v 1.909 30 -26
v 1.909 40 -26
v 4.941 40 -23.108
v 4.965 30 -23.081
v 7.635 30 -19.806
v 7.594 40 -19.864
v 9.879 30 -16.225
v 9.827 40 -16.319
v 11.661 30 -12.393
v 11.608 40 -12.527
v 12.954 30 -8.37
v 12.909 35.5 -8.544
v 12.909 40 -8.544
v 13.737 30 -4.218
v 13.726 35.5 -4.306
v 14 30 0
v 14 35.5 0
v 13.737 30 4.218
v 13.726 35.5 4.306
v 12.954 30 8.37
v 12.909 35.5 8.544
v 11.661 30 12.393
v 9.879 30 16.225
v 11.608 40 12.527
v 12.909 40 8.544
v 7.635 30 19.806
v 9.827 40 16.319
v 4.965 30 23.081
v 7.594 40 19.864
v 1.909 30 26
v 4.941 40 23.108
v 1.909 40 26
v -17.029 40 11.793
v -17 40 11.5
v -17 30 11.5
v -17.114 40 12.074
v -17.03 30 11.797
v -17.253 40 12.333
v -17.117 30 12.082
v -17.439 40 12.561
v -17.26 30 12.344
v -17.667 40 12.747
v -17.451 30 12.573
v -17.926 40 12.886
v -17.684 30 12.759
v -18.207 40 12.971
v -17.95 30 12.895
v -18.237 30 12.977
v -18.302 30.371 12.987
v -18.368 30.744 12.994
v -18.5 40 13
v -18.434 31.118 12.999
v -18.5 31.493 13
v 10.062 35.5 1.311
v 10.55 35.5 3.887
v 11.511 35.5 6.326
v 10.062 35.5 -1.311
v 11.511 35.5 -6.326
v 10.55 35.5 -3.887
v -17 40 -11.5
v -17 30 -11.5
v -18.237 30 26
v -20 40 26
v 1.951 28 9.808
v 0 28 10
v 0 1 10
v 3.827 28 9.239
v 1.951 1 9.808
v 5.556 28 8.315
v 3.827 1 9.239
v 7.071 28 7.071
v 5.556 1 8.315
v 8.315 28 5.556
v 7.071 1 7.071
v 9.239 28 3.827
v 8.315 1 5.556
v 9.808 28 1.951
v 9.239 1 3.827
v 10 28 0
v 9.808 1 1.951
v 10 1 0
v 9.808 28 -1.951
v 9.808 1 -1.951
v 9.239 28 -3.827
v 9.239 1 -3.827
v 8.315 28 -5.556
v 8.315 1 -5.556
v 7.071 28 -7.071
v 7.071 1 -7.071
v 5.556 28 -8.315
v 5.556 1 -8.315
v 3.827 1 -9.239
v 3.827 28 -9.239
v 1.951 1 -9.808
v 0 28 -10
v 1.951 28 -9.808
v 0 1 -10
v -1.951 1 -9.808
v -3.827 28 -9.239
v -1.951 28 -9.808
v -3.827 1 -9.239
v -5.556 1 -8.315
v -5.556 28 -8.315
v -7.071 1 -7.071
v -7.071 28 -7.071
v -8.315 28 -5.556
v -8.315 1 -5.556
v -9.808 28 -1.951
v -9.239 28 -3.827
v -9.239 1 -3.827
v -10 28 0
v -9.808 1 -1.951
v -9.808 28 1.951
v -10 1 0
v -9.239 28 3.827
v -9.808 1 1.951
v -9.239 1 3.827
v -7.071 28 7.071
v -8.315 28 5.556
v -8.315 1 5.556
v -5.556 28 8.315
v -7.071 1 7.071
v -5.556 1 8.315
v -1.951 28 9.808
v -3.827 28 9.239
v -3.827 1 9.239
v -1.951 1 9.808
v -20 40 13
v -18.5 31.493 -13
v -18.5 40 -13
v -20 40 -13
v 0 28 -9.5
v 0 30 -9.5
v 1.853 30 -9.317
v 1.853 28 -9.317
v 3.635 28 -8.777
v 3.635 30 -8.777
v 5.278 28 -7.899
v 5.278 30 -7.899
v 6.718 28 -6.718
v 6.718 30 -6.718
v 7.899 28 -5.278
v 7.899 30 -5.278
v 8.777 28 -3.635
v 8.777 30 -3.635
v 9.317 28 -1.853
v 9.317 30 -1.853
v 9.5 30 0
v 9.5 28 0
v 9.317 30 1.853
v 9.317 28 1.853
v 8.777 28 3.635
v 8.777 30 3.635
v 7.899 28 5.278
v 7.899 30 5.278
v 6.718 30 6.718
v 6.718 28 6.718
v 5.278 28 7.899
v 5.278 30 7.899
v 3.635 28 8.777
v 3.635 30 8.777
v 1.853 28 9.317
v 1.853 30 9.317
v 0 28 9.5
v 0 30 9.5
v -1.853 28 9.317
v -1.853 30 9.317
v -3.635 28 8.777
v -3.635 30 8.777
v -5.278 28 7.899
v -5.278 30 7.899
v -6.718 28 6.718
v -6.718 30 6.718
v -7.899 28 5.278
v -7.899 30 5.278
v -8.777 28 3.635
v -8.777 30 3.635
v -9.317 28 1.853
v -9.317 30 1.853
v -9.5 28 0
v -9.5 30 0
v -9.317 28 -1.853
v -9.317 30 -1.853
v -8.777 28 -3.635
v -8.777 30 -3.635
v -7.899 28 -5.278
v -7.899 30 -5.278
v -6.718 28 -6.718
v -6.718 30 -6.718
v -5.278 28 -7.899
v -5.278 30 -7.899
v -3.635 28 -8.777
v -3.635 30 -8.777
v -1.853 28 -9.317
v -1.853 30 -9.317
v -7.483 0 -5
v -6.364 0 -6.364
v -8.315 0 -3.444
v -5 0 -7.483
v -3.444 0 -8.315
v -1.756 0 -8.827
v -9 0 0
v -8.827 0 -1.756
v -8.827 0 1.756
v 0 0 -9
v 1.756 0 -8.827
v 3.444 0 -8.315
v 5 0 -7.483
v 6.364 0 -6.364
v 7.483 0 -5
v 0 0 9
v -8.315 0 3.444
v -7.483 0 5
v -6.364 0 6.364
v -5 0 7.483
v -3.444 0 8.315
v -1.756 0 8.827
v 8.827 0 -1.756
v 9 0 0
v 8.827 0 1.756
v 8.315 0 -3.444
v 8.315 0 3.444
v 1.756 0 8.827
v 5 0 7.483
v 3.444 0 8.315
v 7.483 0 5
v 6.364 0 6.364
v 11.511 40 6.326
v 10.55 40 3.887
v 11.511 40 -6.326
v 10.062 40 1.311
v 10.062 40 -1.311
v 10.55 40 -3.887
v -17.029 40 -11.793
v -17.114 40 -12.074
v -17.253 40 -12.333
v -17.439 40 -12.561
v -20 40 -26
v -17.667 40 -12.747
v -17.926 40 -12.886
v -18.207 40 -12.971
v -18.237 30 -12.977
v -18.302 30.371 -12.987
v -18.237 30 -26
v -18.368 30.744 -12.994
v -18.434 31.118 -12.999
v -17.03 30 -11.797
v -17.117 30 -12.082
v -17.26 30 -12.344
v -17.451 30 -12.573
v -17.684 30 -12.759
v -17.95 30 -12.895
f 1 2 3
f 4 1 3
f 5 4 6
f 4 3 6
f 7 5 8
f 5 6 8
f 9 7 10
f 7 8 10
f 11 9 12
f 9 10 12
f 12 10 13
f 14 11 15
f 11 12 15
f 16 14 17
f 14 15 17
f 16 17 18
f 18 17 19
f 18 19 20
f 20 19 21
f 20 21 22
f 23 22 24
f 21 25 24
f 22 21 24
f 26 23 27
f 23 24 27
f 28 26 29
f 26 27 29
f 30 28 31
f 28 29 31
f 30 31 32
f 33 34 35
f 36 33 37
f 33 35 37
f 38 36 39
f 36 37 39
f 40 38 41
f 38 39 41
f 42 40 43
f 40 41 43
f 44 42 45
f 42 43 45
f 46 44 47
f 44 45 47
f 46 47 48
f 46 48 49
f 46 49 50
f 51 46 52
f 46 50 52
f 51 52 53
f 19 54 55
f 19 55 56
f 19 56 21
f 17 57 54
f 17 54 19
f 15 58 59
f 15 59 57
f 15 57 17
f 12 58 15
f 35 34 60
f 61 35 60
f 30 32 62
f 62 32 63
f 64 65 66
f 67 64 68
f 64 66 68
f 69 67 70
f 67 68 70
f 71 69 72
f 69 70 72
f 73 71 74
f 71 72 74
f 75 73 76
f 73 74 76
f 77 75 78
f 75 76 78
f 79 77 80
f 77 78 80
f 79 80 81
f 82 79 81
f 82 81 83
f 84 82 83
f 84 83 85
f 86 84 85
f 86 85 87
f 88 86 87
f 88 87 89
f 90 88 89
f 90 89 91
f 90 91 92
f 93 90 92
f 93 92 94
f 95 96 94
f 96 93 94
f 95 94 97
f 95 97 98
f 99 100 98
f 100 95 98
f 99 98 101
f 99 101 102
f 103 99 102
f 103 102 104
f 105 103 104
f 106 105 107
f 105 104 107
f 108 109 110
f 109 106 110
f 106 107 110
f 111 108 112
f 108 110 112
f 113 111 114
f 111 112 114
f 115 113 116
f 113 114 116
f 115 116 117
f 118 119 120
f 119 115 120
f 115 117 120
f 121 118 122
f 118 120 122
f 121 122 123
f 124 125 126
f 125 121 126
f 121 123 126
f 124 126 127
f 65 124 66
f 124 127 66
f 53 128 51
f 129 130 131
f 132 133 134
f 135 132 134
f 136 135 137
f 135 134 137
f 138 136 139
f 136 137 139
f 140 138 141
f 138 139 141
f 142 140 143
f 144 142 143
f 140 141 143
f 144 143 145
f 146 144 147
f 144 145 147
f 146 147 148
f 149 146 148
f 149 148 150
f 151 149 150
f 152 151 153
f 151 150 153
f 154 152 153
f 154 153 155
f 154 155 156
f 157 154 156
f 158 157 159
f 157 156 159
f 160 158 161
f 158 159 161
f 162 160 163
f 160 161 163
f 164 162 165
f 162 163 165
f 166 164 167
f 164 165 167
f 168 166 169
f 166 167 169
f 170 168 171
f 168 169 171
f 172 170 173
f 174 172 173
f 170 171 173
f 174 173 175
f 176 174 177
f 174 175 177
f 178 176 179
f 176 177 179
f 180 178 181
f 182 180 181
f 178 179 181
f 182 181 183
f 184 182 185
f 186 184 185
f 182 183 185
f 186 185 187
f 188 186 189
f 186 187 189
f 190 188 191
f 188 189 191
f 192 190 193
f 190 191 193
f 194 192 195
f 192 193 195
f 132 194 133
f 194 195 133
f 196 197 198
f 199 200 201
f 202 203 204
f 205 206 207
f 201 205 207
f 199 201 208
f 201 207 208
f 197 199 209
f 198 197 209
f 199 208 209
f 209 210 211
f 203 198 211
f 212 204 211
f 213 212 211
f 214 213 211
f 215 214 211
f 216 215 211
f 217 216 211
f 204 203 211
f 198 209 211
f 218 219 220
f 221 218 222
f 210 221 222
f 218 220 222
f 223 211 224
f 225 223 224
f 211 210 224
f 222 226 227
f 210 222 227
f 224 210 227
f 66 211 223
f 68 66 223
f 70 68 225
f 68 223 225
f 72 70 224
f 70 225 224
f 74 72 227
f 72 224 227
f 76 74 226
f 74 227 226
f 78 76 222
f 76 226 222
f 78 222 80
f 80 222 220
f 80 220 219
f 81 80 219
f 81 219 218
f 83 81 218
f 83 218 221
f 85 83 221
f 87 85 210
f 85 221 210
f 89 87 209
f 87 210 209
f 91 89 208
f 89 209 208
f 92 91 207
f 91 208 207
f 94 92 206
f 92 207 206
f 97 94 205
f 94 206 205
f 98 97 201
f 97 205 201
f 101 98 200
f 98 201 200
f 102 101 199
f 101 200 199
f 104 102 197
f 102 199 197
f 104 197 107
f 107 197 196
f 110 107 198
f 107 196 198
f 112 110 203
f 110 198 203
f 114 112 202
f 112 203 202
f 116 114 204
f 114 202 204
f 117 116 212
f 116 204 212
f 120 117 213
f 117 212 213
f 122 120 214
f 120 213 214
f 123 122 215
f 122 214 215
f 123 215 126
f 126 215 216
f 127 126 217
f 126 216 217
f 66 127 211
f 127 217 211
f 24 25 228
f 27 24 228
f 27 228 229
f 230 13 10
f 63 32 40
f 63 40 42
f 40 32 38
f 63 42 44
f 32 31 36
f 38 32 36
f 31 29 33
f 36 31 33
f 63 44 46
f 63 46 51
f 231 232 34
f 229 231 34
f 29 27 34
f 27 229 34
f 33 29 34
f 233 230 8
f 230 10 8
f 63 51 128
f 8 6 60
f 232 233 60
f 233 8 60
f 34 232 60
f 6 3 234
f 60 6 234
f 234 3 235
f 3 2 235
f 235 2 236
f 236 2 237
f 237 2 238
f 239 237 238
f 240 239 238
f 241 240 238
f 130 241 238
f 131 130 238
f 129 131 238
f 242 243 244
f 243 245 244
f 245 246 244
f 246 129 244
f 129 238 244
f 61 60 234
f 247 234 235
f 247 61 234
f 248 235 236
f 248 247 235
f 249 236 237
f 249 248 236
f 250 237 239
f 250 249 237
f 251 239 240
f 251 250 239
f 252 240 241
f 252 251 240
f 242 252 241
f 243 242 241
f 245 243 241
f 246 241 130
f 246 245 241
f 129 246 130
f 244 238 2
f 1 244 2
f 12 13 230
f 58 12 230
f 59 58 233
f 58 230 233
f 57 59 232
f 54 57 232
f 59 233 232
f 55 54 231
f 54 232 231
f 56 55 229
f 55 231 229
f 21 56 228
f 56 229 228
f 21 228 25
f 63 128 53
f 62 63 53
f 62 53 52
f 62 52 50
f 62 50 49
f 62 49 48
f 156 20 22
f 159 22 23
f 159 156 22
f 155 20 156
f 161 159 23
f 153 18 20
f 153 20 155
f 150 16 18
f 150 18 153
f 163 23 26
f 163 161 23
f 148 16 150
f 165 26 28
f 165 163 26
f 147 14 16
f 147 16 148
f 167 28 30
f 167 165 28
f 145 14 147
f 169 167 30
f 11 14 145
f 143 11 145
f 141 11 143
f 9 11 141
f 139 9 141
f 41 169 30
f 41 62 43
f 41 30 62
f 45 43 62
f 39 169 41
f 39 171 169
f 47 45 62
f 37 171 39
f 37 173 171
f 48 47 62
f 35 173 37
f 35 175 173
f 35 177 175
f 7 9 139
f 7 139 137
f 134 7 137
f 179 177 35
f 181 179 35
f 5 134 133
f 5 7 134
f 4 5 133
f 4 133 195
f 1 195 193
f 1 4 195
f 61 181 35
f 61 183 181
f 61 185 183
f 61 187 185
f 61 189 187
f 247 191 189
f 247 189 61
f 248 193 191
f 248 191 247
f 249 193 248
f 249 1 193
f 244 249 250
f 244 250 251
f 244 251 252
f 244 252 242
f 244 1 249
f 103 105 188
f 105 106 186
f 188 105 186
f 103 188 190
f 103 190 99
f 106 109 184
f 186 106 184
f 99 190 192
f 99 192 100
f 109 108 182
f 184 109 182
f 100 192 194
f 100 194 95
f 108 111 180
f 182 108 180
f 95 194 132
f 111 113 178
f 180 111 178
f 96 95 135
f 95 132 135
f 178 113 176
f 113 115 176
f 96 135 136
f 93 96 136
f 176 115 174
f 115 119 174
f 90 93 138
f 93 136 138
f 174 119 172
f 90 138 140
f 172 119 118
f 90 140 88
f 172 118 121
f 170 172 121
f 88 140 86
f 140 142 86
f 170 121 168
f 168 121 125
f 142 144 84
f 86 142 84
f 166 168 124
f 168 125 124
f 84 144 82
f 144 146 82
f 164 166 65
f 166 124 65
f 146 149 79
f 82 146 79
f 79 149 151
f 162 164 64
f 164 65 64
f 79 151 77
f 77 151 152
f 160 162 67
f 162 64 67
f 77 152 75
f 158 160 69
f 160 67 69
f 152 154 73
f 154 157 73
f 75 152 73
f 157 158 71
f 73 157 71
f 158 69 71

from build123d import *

# Parameters (mm, degrees)
SKETCH_1_R               = 10
EXTRUDE_1_DEPTH          = 40
CHAMFER_1_SIZE           = 1
EXTRUDE_2_DEPTH          = 10
SKETCH_3_R               = 14
CUT_EXTRUDE_1_DEPTH      = 4.5
CUT_EXTRUDE_2_DEPTH      = 69.585712798
CUT_EXTRUDE_2_DEPTH_BACK = 69.585712798
SKETCH_5_OUTSIDE_W       = 50.778
SKETCH_5_OUTSIDE_H       = 68.778
SKETCH_5_OUTSIDE_R       = 9.5
CUT_EXTRUDE_3_DEPTH      = 2
FILLET_1_R               = 1.5


with BuildPart() as part:
    # 草图1 → 凸台-拉伸1 (new body)
    with BuildSketch(Plane(origin=(0, 0, 0), x_dir=(1, 0, 0), z_dir=(0, 1, 0))):
        with Locations(Location((0, 0, 0), (0, 0, 270))):
            Circle(SKETCH_1_R)
    extrude(amount=EXTRUDE_1_DEPTH)

    # 倒角1
    chamfer_1_edges = [part.edges().sort_by_distance(p)[0] for p in [
        (0, 0, -10),
    ]]
    chamfer(chamfer_1_edges, length=CHAMFER_1_SIZE)

    # 草图2 → 凸台-拉伸2 (add)
    with BuildSketch(Plane(origin=(0, 40, 0), x_dir=(1, 0, 0), z_dir=(0, 1, 0))):
        with BuildLine():
            Line((-17, -13), (-17, 13))
            Line((-17, 13), (-20, 13))
            Line((-20, 13), (-20, 26))
            Line((-20, 26), (1.9089023, 26))
            ThreePointArc((1.9089023, 26), (14, 0), (1.9089023, -26))
            Line((1.9089023, -26), (-20, -26))
            Line((-20, -26), (-20, -13))
            Line((-20, -13), (-17, -13))
        make_face()
    extrude(amount=-EXTRUDE_2_DEPTH)

    # 草图3 → 切除-拉伸1 (cut)
    with BuildSketch(Plane(origin=(0, 40, 0), x_dir=(1, 0, 0), z_dir=(0, 1, 0))):
        with Locations((24, 0)):
            Circle(SKETCH_3_R)
    extrude(amount=-CUT_EXTRUDE_1_DEPTH, mode=Mode.SUBTRACT)

    # 草图4 → 切除-拉伸2 (cut, two sides: drawn at the far end of the back side and taken through both)
    with BuildSketch(Plane.XY.offset(26).offset(-CUT_EXTRUDE_2_DEPTH_BACK)):
        Polygon((-39.968713517, 153.248201929), (-20, 40), (-18.236730193, 30), (1.731983324, -83.248201929), (-224.764420535, -123.185628963), (-266.465117376, 113.310774896), align=None)
    extrude(amount=CUT_EXTRUDE_2_DEPTH + CUT_EXTRUDE_2_DEPTH_BACK, mode=Mode.SUBTRACT)

    # 草图5 outside → 切除-拉伸3 (cut)
    with BuildSketch(Plane.XZ.offset(-30)):
        with Locations((-3, 0)):
            Rectangle(SKETCH_5_OUTSIDE_W, SKETCH_5_OUTSIDE_H)
        with Locations(Location((0, 0, 0), (0, 0, 270))):
            Circle(SKETCH_5_OUTSIDE_R, mode=Mode.SUBTRACT)
    extrude(amount=CUT_EXTRUDE_3_DEPTH, mode=Mode.SUBTRACT)

    # 圆角1
    fillet_1_edges = [part.edges().sort_by_distance(p)[0] for p in [
        (-17, 35, 13),
        (-17, 35, -13),
    ]]
    fillet(fillet_1_edges, radius=FILLET_1_R)


solid = part.part
